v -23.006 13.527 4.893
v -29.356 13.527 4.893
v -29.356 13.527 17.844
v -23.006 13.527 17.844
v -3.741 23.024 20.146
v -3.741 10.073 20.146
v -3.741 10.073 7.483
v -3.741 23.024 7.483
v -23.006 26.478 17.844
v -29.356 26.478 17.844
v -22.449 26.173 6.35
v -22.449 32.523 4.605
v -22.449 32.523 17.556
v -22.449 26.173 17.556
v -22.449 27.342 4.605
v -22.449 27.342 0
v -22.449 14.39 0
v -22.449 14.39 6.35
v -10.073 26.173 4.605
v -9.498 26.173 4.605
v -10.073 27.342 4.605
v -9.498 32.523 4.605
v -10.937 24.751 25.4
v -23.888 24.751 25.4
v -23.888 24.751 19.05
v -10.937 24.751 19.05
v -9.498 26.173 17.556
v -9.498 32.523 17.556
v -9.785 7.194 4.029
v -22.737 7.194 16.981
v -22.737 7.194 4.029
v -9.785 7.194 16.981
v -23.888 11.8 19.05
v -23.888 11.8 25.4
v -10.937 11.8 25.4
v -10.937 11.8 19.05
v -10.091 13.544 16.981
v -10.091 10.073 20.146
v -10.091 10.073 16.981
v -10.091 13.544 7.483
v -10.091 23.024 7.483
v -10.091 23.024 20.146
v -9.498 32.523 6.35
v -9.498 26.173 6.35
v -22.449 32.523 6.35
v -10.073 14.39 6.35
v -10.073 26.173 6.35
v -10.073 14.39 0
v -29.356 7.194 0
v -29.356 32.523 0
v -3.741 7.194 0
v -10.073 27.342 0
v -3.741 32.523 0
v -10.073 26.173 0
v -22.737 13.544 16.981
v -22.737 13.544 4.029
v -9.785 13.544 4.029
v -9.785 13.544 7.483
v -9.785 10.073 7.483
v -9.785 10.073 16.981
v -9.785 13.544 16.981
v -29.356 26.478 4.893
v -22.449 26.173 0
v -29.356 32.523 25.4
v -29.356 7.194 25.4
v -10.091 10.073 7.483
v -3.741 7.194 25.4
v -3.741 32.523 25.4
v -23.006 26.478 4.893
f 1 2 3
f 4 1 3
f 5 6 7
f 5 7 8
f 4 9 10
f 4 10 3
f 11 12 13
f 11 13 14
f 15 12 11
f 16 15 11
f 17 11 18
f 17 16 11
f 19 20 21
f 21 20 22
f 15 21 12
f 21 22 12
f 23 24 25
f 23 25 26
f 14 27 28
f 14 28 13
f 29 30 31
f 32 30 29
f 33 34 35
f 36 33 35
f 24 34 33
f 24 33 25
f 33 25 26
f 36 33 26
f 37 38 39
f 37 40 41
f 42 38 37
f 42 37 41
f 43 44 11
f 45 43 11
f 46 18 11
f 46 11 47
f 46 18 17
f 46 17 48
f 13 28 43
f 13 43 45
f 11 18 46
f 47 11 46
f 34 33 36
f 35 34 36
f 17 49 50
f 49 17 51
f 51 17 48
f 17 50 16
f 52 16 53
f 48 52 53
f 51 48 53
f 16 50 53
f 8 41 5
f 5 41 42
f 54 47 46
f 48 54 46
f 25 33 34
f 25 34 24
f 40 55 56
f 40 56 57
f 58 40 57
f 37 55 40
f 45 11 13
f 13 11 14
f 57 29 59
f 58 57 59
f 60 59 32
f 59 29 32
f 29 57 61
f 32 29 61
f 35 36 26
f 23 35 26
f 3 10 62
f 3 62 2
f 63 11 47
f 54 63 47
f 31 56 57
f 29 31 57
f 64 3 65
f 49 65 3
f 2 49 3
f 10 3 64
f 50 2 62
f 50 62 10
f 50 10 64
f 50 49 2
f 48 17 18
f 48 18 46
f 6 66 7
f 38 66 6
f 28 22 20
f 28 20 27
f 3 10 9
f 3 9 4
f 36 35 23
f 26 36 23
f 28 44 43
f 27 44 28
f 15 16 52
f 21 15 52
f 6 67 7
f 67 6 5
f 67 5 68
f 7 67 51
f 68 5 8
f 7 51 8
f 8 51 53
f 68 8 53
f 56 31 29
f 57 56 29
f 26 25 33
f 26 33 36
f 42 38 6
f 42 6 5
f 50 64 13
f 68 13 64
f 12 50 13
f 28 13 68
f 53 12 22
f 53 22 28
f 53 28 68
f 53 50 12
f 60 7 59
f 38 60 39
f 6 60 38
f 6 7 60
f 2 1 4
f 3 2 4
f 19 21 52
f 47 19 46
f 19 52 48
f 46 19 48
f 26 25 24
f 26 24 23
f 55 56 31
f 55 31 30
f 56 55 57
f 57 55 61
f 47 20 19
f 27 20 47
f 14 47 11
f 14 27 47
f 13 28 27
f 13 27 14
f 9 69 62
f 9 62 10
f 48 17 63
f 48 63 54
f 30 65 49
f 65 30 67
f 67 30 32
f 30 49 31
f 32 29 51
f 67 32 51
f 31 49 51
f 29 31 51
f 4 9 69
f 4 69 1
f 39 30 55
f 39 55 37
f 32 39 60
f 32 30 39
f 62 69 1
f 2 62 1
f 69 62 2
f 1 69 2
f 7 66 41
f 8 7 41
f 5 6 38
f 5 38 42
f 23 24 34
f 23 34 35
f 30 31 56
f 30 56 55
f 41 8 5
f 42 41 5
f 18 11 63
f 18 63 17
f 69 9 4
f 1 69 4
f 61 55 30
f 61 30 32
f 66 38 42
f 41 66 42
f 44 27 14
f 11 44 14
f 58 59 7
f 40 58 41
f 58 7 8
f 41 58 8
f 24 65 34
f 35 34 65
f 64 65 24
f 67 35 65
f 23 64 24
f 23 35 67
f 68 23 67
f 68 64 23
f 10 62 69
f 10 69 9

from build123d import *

# Parameters (mm, degrees)
F0_W      = 25.6147121545
F0_H      = 25.3289761022
F1_DEPTH  = 25.4
F2_W      = 12.9512595013
F2_H      = 12.6634538174
F3_DEPTH  = 6.35
F4_W      = 12.95125857
F4_H      = 12.9512581043
F5_DEPTH  = 6.35
F6_W      = 12.9512595013
F6_H      = 12.95125857
F7_DEPTH  = 6.35
F8_W      = 12.9512595013
F8_H      = 12.9512590356
F9_DEPTH  = 6.35
F10_W     = 12.9512595013
F10_H     = 12.9512595013
F11_DEPTH = 6.35
F12_W     = 12.3756472021
F12_H     = 12.9512595013
F13_DEPTH = 6.35
F14_W     = 12.9512595013
F14_H     = 12.95125857
F15_DEPTH = 6.35
F16_W     = 12.9512595013
F16_H     = 11.2061513752
F17_DEPTH = 6.35
F18_W     = 12.95125857
F18_H     = 12.9512581043
F19_DEPTH = 6.35
F20_W     = 12.9512595013
F20_H     = 12.9512595013
F21_DEPTH = 6.35
F22_W     = 12.3756472021
F22_H     = 11.7831494823
F23_DEPTH = 6.35
F24_W     = 12.9512595013
F24_H     = 12.6634538174
F25_DEPTH = 6.35


with BuildPart() as f1:
    # F0 (on Top) → F1 (new body)
    with BuildSketch(Plane.XY):
        with Locations((-16.5488311322, 19.8589502834)):
            Rectangle(F0_W, F0_H)
    extrude(amount=F1_DEPTH)

    # F2 (on face) → F3 (cut)
    with BuildSketch(Plane.YZ.offset(-3.741475055)):
        with Locations((16.5488305502, 13.814676553)):
            Rectangle(F2_W, F2_H)
    extrude(amount=-F3_DEPTH, mode=Mode.SUBTRACT)

    # F4 (on face) → F5 (cut)
    with BuildSketch(Plane(origin=(-29.3561872095, 0, 0), x_dir=(0, -1, 0), z_dir=(-1, 0, 0))):
        with Locations((-20.0025010854, 11.3683270756)):
            Rectangle(F4_W, F4_H)
    extrude(amount=-F5_DEPTH, mode=Mode.SUBTRACT)

    # F6 (on face) → F7 (cut)
    with BuildSketch(Plane.XY.offset(25.4)):
        with Locations((-17.4122485332, 18.2756651193)):
            Rectangle(F6_W, F6_H)
    extrude(amount=-F7_DEPTH, mode=Mode.SUBTRACT)

    # F8 (on face) → F9 (cut)
    with BuildSketch(Plane(origin=(0, 32.5234383345, 0), x_dir=(-1, 0, 0), z_dir=(0, 1, 0))):
        with Locations((15.9732191823, 11.0805218574)):
            Rectangle(F8_W, F8_H)
    extrude(amount=-F9_DEPTH, mode=Mode.SUBTRACT)

    # F10 (on face) → F11 (cut)
    with BuildSketch(Plane.XZ.offset(-7.1944622323)):
        with Locations((-16.2610257976, 10.5049102567)):
            Rectangle(F10_W, F10_H)
    extrude(amount=-F11_DEPTH, mode=Mode.SUBTRACT)

    # F12 (on face) → F13 (cut)
    with BuildSketch(Plane(origin=(0, 0, 0), x_dir=(1, 0, 0), z_dir=(0, 0, -1))):
        with Locations((-16.2610253319, -20.8659186028)):
            Rectangle(F12_W, F12_H)
    extrude(amount=-F13_DEPTH, mode=Mode.SUBTRACT)


with BuildPart() as f15:
    # F14 (on face) → F15 (new body)
    with BuildSketch(Plane.XY.offset(19.05)):
        with Locations((-17.4122485332, 18.2756651193)):
            Rectangle(F14_W, F14_H)
    extrude(amount=F15_DEPTH)


with BuildPart() as f17:
    # F16 (on face) → F17 (new body)
    with BuildSketch(Plane(origin=(0, 26.1734383345, 0), x_dir=(-1, 0, 0), z_dir=(0, 1, 0))):
        with Locations((15.9732191823, 11.9530756876)):
            Rectangle(F16_W, F16_H)
    extrude(amount=F17_DEPTH)


with BuildPart() as f19:
    # F18 (on face) → F19 (new body)
    with BuildSketch(Plane(origin=(-23.0061872095, 0, 0), x_dir=(0, -1, 0), z_dir=(-1, 0, 0))):
        with Locations((-20.0025010854, 11.3683270756)):
            Rectangle(F18_W, F18_H)
    extrude(amount=F19_DEPTH)


with BuildPart() as f21:
    # F20 (on face) → F21 (new body)
    with BuildSketch(Plane.XZ.offset(-13.5444622323)):
        with Locations((-16.2610257976, 10.5049102567)):
            Rectangle(F20_W, F20_H)
    extrude(amount=F21_DEPTH)


with BuildPart() as f23:
    # F22 (on face) → F23 (new body)
    with BuildSketch(Plane(origin=(0, 0, 6.35), x_dir=(1, 0, 0), z_dir=(0, 0, -1))):
        with Locations((-16.2610253319, -20.2818635933)):
            Rectangle(F22_W, F22_H)
    extrude(amount=F23_DEPTH)


with BuildPart() as f25:
    # F24 (on face) → F25 (new body)
    with BuildSketch(Plane.YZ.offset(-10.091475055)):
        with Locations((16.5488305502, 13.814676553)):
            Rectangle(F24_W, F24_H)
    extrude(amount=F25_DEPTH)


solid = Compound([f1.part, f15.part, f17.part, f19.part, f21.part, f23.part, f25.part])
